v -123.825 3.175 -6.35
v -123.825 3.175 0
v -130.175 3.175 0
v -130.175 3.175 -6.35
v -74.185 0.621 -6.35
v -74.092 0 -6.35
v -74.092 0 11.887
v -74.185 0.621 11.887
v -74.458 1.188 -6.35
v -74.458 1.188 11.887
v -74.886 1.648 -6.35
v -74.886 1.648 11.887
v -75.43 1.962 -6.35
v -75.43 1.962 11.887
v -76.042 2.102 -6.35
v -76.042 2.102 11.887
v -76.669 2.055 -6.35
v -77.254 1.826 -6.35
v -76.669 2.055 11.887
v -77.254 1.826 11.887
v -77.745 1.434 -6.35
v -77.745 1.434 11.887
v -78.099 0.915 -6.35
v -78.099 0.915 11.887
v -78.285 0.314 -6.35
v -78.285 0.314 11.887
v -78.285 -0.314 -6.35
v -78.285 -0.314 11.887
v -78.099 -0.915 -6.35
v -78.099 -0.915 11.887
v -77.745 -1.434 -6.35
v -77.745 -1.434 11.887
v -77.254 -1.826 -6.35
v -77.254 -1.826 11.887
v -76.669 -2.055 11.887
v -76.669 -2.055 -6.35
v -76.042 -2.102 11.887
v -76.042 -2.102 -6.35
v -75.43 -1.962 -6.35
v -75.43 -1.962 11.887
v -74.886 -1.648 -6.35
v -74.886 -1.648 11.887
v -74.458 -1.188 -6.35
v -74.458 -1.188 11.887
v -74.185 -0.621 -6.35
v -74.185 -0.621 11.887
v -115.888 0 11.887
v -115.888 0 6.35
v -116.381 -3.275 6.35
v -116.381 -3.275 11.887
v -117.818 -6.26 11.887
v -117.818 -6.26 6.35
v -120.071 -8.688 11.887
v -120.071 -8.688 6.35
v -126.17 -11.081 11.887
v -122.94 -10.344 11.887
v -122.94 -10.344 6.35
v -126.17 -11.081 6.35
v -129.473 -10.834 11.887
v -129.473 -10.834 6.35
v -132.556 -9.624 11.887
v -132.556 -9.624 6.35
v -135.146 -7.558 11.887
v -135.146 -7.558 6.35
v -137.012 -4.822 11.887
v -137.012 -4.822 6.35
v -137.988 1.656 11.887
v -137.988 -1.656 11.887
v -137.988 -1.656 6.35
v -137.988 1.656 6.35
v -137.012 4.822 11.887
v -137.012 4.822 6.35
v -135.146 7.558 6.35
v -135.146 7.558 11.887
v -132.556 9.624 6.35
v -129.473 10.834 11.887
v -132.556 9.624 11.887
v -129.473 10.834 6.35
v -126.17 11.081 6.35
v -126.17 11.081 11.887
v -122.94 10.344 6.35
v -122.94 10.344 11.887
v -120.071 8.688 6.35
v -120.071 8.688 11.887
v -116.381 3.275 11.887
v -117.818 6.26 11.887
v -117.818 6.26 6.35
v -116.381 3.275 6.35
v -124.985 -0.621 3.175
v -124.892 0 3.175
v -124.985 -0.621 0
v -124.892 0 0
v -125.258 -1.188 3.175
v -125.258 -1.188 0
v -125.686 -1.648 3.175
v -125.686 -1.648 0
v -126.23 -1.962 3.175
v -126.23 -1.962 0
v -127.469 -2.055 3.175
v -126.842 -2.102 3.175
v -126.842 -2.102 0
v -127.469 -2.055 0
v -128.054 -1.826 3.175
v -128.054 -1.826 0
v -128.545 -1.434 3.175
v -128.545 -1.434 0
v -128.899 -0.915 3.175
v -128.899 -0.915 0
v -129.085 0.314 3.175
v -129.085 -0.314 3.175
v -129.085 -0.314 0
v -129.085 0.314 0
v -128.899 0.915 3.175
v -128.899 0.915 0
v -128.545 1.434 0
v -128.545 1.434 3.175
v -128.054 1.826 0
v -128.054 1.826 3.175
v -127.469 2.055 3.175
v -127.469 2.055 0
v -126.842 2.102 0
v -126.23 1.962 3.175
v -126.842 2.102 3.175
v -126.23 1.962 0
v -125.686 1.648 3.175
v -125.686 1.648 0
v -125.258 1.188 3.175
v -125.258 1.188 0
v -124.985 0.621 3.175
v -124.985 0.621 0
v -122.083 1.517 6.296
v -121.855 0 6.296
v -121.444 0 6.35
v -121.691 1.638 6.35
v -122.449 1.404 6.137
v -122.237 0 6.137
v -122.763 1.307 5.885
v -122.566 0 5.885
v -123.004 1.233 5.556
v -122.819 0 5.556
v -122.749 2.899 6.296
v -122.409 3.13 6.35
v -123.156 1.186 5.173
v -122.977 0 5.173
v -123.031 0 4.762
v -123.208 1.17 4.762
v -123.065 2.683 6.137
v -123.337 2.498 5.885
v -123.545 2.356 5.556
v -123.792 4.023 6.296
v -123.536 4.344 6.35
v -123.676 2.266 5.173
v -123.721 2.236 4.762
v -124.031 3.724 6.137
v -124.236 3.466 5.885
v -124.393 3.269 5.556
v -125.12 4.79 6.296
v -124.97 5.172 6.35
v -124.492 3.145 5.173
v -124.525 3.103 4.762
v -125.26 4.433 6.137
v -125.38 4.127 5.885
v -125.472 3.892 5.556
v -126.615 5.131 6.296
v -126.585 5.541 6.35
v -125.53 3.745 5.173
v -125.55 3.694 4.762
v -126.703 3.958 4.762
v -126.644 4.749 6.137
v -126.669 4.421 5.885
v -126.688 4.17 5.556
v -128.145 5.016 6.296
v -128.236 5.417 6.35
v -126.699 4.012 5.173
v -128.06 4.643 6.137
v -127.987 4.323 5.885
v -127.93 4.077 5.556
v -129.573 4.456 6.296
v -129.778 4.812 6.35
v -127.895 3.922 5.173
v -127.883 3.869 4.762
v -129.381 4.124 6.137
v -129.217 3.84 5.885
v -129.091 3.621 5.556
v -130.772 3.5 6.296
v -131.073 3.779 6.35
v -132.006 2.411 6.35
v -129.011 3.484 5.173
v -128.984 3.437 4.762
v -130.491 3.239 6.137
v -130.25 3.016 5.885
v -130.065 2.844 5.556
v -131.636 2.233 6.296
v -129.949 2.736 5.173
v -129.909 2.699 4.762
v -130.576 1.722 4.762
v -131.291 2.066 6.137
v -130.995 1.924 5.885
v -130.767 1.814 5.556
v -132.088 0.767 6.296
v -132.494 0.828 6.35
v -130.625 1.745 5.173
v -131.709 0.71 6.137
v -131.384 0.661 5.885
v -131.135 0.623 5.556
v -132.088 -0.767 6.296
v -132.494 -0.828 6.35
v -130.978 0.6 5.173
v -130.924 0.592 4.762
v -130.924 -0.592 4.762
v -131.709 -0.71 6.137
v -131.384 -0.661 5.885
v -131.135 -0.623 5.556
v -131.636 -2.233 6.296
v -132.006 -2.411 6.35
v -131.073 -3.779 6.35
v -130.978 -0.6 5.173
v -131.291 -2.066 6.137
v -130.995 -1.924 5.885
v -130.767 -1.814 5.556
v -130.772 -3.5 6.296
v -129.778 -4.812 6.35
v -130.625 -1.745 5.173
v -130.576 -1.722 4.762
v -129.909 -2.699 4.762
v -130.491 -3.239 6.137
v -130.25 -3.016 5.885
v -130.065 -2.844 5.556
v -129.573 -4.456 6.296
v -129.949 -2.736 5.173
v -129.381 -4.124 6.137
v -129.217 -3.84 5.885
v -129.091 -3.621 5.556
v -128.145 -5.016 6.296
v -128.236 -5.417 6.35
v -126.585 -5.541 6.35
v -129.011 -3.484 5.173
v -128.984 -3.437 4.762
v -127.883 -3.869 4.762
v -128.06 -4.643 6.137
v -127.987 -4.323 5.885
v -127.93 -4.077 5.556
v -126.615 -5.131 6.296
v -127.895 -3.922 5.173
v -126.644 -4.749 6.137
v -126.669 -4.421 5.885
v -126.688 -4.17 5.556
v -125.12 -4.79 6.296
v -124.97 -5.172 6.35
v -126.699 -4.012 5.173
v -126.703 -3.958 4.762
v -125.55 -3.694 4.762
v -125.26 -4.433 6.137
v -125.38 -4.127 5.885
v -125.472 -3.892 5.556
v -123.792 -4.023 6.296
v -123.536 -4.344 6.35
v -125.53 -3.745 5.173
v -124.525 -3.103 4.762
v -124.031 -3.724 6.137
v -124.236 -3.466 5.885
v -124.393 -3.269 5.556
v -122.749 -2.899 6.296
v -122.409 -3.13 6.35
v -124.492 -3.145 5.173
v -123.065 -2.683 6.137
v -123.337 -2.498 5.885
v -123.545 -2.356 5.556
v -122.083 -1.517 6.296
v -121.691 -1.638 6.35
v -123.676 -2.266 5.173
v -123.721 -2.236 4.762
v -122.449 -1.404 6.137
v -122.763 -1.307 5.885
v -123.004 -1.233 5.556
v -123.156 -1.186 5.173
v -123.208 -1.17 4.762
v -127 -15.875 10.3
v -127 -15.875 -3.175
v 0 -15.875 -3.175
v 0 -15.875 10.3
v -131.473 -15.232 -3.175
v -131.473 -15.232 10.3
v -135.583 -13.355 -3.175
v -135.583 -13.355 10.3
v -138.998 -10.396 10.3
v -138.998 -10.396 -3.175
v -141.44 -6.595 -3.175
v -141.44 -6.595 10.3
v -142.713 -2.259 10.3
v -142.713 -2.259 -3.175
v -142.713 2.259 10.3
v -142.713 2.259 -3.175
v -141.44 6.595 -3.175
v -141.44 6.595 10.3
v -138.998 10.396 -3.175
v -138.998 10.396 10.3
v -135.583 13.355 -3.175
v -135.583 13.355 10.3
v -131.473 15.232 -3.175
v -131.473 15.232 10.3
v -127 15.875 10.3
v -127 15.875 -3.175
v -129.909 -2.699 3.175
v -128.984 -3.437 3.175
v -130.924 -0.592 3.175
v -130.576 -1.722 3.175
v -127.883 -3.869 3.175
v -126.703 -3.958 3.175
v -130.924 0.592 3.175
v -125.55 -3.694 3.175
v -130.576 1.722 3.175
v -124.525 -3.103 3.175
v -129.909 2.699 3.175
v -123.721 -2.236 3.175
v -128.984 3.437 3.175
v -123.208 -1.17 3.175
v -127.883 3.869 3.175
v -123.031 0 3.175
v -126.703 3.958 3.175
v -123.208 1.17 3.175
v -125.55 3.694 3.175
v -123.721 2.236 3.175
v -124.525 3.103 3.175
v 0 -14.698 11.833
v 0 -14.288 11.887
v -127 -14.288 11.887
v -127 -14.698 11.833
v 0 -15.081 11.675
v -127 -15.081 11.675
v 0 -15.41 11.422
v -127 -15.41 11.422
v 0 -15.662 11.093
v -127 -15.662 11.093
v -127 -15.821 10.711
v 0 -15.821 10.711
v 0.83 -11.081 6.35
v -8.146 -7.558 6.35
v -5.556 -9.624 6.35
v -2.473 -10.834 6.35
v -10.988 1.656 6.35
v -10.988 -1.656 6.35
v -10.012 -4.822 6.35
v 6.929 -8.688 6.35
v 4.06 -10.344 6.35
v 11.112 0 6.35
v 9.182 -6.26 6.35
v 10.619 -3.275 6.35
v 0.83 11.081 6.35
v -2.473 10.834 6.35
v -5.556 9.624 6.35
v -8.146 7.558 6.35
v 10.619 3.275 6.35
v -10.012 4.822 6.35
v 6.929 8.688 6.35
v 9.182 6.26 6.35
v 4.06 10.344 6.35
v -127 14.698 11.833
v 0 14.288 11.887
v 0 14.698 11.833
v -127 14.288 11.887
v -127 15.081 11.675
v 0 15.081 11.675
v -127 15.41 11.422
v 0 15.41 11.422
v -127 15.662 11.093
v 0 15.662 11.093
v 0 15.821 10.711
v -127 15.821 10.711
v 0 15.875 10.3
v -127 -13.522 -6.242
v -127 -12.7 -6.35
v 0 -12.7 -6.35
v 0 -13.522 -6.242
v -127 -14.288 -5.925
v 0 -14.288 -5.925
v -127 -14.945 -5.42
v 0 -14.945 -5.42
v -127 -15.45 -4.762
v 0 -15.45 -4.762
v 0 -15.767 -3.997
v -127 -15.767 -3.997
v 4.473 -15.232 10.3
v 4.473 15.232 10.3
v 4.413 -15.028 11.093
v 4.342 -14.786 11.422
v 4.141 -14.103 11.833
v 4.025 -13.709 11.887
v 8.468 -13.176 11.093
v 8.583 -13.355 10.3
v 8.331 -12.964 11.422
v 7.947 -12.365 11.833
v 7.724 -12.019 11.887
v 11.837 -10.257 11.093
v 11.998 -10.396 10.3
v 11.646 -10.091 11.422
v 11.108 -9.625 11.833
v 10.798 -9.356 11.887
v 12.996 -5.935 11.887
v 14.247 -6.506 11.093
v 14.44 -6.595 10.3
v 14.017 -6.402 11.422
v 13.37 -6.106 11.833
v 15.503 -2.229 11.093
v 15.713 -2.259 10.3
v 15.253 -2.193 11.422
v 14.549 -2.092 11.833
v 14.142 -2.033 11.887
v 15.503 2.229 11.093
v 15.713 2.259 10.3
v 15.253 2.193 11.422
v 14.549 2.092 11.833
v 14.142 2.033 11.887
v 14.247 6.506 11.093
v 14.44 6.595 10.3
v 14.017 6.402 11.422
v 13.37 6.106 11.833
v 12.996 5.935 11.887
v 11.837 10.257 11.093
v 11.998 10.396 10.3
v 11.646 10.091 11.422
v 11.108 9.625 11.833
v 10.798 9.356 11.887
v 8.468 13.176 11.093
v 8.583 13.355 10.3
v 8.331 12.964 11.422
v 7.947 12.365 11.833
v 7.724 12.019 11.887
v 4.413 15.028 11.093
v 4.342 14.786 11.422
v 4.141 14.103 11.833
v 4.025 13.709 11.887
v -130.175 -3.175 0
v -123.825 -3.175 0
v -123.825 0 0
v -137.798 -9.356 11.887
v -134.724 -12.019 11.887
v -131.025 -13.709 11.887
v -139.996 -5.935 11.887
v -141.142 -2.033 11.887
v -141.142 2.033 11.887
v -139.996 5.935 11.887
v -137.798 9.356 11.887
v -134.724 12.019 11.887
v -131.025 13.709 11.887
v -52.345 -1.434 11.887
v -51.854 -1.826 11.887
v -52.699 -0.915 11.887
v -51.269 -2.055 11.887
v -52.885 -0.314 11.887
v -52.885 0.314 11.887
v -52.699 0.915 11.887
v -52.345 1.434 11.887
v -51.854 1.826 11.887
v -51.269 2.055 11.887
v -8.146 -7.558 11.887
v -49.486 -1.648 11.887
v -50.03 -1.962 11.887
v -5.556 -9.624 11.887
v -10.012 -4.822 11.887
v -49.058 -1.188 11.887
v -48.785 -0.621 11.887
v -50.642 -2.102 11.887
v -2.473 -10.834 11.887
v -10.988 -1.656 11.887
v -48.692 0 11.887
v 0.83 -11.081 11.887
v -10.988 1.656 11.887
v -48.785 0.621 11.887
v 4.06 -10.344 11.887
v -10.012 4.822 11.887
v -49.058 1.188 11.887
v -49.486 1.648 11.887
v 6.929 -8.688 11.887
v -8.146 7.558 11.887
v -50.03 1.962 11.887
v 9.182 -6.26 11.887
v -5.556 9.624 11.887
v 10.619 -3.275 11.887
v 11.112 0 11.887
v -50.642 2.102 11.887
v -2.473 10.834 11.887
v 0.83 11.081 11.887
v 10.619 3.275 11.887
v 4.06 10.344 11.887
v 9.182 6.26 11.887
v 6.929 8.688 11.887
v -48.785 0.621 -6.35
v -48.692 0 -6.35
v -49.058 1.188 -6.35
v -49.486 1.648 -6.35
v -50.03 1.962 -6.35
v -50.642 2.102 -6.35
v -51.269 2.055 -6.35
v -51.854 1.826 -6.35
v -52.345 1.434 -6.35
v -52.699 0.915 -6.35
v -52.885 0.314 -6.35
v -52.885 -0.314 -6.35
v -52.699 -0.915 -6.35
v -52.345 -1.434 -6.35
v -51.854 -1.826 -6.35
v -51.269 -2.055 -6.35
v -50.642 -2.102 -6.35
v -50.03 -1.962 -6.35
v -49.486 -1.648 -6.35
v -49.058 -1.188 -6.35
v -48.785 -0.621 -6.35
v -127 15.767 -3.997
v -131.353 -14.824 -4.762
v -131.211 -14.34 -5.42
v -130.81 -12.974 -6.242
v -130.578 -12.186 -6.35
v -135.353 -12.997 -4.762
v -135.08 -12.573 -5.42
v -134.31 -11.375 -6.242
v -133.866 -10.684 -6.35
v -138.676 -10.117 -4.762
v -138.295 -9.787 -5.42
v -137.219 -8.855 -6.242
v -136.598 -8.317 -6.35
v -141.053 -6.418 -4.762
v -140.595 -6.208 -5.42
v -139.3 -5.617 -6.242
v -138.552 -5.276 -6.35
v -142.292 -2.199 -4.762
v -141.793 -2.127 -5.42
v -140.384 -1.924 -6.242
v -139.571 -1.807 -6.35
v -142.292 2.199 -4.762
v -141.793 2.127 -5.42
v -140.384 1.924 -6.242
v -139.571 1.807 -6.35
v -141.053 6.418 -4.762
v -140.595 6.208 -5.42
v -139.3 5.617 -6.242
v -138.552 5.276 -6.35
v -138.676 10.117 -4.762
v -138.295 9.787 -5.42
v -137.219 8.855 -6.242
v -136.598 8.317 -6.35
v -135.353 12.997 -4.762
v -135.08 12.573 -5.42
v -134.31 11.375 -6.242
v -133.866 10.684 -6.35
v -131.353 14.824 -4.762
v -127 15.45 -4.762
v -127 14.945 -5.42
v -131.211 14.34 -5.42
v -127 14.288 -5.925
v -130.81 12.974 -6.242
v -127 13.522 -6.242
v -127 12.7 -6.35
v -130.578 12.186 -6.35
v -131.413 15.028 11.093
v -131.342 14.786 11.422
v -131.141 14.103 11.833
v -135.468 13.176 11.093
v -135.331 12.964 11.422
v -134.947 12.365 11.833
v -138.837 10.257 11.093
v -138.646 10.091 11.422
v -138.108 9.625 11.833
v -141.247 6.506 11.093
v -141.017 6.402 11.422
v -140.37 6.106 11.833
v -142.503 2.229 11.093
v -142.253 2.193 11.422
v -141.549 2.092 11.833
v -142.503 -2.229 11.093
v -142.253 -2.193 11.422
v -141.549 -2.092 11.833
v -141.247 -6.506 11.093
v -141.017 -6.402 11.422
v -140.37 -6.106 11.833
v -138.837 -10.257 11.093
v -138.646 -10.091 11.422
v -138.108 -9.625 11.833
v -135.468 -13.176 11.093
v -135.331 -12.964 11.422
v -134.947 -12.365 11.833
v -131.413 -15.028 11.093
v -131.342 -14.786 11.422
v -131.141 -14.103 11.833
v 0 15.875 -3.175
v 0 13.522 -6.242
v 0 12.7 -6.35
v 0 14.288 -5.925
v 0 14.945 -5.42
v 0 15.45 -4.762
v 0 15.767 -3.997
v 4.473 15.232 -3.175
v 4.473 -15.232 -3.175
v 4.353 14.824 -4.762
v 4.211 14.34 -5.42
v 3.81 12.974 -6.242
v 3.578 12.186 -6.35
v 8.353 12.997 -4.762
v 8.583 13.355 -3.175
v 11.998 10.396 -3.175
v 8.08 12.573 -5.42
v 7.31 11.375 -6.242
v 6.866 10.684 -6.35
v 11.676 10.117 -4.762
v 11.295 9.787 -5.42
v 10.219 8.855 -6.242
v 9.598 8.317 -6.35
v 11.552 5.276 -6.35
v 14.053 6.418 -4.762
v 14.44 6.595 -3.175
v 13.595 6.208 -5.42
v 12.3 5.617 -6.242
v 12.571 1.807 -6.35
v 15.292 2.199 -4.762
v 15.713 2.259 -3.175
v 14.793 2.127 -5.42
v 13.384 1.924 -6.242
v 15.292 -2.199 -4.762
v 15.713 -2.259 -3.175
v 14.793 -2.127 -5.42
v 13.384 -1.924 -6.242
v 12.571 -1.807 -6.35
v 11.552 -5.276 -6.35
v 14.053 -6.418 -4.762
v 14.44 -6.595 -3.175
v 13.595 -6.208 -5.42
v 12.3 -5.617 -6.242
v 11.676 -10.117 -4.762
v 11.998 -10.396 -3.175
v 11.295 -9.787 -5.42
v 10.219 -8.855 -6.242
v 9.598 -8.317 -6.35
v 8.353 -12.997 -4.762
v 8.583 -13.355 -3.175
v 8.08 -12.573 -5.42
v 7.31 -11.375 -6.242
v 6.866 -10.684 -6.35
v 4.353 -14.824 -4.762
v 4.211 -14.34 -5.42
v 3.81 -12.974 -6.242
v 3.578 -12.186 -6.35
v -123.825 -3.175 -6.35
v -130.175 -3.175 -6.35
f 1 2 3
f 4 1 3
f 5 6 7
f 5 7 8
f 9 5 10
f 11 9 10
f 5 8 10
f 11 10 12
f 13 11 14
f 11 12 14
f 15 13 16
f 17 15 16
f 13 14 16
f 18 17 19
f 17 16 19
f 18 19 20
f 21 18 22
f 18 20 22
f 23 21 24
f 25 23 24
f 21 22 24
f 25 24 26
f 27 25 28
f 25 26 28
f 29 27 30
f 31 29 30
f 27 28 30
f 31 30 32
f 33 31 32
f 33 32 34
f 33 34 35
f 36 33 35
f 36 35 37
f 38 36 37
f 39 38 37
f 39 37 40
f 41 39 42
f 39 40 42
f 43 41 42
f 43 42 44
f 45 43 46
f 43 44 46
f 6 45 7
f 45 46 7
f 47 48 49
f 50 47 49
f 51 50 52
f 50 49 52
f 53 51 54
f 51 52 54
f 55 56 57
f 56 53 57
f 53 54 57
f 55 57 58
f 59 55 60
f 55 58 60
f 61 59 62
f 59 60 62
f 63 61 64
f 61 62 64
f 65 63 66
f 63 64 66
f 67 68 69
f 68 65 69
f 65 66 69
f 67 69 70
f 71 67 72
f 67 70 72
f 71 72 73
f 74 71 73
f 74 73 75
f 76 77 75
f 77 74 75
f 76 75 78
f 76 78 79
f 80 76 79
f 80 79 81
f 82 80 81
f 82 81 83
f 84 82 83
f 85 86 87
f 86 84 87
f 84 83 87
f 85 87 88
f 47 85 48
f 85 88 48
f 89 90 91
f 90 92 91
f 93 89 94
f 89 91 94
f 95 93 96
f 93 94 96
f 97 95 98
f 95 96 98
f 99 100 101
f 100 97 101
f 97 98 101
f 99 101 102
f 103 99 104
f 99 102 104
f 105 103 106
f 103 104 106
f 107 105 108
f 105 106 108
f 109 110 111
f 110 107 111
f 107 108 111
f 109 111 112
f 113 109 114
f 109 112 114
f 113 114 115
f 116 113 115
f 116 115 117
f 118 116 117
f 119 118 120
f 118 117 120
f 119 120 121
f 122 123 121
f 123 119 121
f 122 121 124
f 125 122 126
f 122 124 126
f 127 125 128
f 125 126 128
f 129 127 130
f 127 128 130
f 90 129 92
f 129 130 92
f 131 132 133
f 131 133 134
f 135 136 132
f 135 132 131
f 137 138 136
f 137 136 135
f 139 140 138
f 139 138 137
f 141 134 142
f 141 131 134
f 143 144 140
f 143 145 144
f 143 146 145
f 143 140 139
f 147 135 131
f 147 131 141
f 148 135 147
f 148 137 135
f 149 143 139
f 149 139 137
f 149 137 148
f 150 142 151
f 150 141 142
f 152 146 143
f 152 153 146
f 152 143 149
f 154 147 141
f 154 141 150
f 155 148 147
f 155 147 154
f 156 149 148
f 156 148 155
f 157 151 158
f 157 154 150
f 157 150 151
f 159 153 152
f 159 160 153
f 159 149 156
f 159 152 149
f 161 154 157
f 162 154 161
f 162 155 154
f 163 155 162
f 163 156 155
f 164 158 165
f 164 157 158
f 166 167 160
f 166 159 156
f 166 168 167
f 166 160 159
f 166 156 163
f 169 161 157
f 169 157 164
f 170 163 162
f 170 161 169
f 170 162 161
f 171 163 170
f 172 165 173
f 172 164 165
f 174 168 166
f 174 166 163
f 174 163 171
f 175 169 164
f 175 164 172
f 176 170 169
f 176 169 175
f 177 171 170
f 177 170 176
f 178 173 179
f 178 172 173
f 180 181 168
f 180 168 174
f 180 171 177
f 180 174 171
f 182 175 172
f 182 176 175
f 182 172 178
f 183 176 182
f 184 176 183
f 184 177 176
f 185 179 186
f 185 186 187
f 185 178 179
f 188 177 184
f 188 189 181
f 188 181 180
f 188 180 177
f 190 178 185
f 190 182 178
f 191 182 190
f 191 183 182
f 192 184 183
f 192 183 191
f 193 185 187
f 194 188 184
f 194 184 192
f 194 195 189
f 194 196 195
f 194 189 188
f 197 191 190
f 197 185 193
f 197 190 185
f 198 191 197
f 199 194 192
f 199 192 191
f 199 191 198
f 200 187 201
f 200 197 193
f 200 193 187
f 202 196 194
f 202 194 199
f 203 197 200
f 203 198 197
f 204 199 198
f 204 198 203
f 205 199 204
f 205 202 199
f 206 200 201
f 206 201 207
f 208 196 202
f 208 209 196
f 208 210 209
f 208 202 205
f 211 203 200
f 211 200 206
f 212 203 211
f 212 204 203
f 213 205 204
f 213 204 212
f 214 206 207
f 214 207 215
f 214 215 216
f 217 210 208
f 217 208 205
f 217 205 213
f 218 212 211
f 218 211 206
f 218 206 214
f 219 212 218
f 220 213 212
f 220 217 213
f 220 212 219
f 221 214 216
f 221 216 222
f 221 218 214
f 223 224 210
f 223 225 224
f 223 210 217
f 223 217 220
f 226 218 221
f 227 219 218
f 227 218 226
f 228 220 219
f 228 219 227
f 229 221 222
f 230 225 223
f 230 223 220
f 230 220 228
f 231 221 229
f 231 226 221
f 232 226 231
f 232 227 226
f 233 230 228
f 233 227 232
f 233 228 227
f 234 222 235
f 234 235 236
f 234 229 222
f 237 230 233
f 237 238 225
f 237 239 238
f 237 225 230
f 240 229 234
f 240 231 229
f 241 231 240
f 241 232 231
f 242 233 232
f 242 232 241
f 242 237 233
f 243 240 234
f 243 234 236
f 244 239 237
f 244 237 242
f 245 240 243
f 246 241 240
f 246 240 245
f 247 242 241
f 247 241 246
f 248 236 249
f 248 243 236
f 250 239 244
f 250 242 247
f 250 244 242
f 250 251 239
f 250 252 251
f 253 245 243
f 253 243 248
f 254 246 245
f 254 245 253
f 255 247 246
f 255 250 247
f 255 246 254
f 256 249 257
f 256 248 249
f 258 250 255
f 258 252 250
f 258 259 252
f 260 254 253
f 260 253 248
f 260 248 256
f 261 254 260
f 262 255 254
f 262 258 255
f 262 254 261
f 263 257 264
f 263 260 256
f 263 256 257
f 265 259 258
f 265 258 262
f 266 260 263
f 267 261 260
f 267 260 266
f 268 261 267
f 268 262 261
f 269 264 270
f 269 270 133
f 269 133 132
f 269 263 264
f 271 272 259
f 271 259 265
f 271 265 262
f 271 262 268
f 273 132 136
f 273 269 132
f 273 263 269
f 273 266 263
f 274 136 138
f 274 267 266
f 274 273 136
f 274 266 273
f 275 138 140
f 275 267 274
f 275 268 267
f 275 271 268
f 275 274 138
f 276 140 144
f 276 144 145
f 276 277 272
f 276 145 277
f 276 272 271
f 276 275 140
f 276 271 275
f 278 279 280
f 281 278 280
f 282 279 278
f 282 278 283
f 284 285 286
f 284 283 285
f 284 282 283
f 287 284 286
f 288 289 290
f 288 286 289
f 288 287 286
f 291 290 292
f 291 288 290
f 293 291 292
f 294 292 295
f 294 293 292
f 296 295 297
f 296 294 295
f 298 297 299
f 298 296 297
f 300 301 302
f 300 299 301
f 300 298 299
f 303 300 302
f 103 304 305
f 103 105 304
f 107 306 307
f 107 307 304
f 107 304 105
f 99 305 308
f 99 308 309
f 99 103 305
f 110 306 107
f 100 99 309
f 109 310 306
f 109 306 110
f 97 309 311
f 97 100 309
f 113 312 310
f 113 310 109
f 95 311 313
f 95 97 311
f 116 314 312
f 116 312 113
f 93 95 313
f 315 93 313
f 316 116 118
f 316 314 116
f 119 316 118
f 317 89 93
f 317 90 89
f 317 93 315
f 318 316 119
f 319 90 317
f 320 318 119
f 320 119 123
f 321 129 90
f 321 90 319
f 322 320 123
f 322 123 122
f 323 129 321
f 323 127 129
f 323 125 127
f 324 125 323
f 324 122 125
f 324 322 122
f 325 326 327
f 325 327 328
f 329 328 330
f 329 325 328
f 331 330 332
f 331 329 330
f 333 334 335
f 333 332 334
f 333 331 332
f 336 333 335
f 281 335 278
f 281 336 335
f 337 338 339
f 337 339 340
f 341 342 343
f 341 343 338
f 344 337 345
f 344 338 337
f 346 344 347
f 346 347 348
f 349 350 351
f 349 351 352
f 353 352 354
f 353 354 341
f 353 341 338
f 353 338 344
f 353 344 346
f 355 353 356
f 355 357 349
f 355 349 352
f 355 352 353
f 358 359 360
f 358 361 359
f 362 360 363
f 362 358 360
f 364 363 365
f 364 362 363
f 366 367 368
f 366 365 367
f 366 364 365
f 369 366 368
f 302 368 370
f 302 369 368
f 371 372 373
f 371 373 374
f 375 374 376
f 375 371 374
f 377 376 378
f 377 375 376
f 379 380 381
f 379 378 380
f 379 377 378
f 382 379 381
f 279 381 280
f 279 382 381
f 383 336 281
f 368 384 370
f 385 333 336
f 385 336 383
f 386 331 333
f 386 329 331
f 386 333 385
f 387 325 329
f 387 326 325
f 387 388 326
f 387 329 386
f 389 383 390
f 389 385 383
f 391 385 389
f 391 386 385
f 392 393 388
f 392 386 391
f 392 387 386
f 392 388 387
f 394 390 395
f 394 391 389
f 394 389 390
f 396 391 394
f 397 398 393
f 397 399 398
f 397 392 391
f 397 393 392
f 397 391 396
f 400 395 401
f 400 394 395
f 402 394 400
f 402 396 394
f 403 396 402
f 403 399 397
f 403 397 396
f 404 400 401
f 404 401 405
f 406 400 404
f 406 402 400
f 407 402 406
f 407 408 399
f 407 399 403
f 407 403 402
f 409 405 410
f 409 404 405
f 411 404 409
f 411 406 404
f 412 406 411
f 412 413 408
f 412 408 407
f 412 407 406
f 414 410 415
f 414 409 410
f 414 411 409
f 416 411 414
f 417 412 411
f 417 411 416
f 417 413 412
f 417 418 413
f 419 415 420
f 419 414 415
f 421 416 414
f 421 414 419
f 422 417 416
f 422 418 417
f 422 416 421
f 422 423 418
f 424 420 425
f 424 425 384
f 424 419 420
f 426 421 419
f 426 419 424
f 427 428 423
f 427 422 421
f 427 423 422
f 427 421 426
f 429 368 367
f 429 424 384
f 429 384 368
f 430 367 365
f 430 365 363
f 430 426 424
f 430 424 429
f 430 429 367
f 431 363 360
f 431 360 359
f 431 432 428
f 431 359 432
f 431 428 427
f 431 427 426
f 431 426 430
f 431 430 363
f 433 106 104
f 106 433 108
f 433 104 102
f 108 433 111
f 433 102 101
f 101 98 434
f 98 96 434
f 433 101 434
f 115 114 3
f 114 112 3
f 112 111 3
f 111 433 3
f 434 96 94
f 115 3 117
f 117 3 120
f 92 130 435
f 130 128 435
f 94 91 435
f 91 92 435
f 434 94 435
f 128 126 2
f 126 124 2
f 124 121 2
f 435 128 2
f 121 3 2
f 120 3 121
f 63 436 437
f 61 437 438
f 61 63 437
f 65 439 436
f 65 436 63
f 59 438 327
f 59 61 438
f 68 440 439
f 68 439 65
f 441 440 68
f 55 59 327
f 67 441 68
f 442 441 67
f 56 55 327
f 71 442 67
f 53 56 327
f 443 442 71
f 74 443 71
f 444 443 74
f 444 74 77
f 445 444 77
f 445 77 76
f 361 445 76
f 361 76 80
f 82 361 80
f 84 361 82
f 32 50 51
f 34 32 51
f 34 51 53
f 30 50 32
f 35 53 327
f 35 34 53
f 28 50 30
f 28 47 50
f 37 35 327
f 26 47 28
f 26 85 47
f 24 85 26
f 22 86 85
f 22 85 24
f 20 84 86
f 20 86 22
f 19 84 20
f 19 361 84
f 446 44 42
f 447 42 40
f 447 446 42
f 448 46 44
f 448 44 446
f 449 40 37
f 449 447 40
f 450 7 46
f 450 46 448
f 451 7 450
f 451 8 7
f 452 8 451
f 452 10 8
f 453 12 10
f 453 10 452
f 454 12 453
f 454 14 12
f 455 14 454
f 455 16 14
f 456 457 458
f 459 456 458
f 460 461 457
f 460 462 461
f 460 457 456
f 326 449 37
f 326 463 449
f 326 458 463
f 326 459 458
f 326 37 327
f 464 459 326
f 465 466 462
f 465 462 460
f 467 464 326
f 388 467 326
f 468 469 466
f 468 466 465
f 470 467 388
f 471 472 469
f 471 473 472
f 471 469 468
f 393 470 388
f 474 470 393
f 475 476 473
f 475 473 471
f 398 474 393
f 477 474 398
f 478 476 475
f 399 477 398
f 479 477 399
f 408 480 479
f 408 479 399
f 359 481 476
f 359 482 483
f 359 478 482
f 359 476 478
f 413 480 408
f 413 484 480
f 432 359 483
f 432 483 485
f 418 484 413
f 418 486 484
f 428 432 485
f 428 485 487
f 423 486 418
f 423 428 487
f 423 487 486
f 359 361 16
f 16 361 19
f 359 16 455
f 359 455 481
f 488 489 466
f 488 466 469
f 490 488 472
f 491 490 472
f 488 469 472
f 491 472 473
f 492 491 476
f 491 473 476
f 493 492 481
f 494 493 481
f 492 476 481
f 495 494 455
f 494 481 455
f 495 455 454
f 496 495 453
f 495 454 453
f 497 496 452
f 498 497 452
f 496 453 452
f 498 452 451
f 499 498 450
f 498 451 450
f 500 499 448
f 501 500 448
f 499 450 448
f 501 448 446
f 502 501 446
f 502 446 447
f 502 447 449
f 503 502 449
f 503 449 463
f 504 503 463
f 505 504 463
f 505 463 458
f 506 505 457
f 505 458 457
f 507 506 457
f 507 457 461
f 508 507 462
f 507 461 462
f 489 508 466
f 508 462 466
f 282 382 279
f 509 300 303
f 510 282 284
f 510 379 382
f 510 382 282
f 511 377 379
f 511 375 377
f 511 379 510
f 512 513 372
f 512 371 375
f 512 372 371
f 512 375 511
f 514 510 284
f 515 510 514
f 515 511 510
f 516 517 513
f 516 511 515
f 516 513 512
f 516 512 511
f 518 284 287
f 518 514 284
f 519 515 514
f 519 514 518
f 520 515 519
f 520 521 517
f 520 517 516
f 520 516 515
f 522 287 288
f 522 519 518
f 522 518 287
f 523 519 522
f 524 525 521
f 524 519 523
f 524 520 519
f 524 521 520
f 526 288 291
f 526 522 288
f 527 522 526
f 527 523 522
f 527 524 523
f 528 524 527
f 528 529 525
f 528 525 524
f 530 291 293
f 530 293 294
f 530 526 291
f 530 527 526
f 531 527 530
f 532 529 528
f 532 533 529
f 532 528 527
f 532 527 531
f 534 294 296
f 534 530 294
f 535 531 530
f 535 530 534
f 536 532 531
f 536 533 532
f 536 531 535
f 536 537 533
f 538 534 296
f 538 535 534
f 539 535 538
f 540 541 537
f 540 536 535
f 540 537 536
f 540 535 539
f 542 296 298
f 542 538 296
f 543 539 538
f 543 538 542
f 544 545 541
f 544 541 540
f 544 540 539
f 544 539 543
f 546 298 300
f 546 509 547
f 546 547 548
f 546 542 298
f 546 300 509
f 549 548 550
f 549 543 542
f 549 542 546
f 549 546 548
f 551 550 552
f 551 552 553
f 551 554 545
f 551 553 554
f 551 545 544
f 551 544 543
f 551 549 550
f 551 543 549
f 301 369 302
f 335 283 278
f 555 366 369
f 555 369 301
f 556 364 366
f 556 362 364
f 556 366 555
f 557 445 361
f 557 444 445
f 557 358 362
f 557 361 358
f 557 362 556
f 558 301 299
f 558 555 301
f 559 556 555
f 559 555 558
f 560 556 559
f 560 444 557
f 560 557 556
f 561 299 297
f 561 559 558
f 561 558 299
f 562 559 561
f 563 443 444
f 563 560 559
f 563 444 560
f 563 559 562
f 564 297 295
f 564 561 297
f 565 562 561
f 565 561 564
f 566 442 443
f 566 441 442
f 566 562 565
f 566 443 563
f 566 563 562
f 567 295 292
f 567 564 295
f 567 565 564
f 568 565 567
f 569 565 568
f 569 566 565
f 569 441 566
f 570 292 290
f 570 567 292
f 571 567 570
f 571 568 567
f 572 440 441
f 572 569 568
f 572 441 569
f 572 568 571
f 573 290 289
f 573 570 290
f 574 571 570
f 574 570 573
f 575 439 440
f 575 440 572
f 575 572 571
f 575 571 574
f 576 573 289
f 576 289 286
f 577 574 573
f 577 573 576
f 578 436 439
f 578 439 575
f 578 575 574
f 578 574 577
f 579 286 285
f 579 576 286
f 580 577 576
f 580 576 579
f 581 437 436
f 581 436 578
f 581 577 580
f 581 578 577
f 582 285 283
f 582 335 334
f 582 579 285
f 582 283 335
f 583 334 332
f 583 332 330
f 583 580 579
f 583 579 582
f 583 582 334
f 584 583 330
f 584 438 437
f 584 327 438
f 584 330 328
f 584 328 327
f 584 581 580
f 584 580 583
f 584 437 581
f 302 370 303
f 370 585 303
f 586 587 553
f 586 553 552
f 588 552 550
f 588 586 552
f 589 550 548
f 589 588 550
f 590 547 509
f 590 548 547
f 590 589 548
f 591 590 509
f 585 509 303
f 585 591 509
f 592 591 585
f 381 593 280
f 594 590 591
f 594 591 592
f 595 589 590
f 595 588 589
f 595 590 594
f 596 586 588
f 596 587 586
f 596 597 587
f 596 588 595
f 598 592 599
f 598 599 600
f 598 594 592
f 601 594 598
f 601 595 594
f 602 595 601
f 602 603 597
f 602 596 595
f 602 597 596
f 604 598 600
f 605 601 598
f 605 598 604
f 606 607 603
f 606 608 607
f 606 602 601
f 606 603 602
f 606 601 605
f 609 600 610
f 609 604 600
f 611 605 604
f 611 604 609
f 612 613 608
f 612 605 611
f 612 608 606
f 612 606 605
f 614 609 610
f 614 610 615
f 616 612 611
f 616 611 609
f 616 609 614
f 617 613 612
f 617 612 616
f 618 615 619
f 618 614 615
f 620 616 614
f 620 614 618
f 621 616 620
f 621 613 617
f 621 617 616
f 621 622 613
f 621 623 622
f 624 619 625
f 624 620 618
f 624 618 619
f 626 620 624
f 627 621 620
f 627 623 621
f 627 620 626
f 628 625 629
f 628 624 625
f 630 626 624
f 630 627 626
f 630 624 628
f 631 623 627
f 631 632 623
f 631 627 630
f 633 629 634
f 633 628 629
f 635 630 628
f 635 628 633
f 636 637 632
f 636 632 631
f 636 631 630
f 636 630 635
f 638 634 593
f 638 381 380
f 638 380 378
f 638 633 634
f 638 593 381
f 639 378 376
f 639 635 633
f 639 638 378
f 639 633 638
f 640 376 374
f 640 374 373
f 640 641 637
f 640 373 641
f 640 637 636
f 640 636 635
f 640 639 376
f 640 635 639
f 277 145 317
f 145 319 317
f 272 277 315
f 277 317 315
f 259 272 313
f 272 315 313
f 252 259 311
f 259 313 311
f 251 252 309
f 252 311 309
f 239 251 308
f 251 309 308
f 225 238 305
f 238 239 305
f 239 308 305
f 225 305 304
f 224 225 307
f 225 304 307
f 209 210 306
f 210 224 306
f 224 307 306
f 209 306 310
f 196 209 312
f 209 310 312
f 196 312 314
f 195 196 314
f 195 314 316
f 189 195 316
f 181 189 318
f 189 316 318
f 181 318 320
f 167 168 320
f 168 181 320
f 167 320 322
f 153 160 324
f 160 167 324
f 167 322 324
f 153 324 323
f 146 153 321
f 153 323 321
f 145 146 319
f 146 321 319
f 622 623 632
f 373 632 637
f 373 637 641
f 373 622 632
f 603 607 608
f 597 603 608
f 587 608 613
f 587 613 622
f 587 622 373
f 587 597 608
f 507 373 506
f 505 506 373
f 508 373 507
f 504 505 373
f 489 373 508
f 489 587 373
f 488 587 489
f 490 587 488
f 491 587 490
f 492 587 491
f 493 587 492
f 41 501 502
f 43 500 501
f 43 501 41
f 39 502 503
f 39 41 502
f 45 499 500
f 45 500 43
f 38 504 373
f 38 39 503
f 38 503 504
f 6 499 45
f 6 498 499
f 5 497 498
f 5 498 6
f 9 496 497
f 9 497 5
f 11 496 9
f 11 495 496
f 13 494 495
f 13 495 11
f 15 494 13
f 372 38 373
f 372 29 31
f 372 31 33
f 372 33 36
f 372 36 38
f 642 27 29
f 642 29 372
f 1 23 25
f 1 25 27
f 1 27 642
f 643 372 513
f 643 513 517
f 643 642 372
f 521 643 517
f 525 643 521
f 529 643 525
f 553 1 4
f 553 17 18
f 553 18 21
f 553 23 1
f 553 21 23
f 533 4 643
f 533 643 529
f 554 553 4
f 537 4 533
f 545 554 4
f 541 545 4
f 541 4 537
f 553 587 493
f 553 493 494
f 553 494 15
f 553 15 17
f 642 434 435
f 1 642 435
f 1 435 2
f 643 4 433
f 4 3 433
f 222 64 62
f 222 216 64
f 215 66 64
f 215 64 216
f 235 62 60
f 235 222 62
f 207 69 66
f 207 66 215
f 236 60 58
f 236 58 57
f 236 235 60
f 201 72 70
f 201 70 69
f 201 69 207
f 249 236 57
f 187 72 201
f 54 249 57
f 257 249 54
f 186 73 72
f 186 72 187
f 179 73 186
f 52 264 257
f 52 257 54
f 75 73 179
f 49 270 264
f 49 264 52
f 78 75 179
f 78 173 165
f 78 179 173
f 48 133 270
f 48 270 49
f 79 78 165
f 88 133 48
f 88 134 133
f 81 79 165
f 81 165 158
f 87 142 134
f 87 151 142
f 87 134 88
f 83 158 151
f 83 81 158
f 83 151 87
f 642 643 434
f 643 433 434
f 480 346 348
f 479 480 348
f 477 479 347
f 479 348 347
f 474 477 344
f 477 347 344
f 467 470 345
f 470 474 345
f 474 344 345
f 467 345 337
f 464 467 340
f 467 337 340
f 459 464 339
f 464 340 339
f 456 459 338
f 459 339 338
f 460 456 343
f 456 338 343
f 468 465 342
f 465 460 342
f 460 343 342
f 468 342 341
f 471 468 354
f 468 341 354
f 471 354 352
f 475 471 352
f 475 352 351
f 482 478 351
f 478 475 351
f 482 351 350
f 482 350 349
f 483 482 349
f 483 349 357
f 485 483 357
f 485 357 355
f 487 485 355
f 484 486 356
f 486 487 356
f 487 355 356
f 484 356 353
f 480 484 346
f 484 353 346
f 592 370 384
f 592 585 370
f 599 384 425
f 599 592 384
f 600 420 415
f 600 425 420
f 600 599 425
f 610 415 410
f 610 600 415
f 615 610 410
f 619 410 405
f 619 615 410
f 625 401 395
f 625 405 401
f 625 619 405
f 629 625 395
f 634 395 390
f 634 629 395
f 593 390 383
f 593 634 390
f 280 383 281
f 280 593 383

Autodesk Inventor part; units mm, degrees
ref_plane "YZ Plane" through (0, 0, 0) normal (1, 0, 0) x (0, 1, 0)
ref_plane "XZ Plane" through (0, 0, 0) normal (0, 1, 0) x (-1, 0, 0)
ref_plane "XY Plane" through (0, 0, 0) normal (0, 0, 1) x (1, 0, 0)
sketch "Sketch1" plane through (0, 0, 0) normal (0, 0, 1) x (1, 0, 0)
  circle A0 centre (0, 0) radius 15.875
  line L0 (0, 0) -> (-127, 0)
  circle A1 centre (-127, 0) radius 15.875
  line L1 (-127, 15.875) -> (0, 15.875)
  line L2 (0, -15.875) -> (-127, -15.875)
  circle A2 centre (-127, 0) radius 2.1082
  dimension "d0" = 31.75
  dimension "d1" = 127
  dimension "d2" = 31.75
  dimension "d3" = 4.2164
extrude "Extrusion1" add sketch "Sketch1" along normal blind 3.175
sketch "Sketch2" plane through (0, 0, 0) normal (0, 0, -1) x (-1, 0, 0)
  arc A0 (127, -15.875) -> (127, 15.875) centre (127, 0) ccw projected
  line L0 (0, 15.875) -> (127, 15.875) projected
  arc A1 (0, 15.875) -> (0, -15.875) centre (0, 0) ccw projected
  line L1 (127, -15.875) -> (0, -15.875) projected
  circle A2 centre (127, 0) radius 2.1082 projected
  line L2 (130.175, -3.175) -> (123.825, -3.175)
  line L3 (123.825, -3.175) -> (123.825, 3.175)
  line L4 (123.825, 3.175) -> (130.175, 3.175)
  line L5 (130.175, 3.175) -> (130.175, -3.175)
  line L6 (130.175, -3.175) -> (123.825, 3.175) construction
  line L7 (123.825, -3.175) -> (130.175, 3.175) construction
  dimension "d25" = 6.35
  dimension "d26" = 6.35
extrude "Extrusion2" add sketch "Sketch2" along normal blind 6.35 contours L1 A1 L0 A0
fillet "Fillet1" radius 3.175 4 edges at (15.875, 0, -6.35) (-63.5, -15.875, -6.35) (-142.875, 0, -6.35) (-63.5, 15.875, -6.35)
sketch "Sketch3" plane through (0, 0, 3.175) normal (0, 0, 1) x (1, 0, 0)
  arc A0 (-127, 15.875) -> (-127, -15.875) centre (-127, 0) ccw projected
  line L0 (-127, -15.875) -> (0, -15.875) projected
  arc A1 (0, -15.875) -> (0, 15.875) centre (0, 0) ccw projected
  line L1 (0, 15.875) -> (-127, 15.875) projected
  circle A2 centre (-127, 0) radius 2.1082 projected
  circle A3 centre (-127, 0) radius 3.9688
  dimension "d10" = 7.9375
extrude "Extrusion3" add sketch "Sketch3" along normal blind 3.175 contours L1 A1 L0 A0
sketch "Sketch4" plane through (0, 0, 6.35) normal (0, 0, 1) x (1, 0, 0)
  line L0 (-127, -15.875) -> (0, -15.875) projected
  arc A0 (0, -15.875) -> (0, 15.875) centre (0, 0) ccw projected
  line L1 (0, 15.875) -> (-127, 15.875) projected
  arc A1 (-127, 15.875) -> (-127, -15.875) centre (-127, 0) ccw projected
  circle A2 centre (-127, 0) radius 3.9688 projected
  circle A3 centre (-127, 0) radius 2.1082 projected
  circle A4 centre (-127, 0) radius 11.1125
  circle A5 centre (0, 0) radius 11.1125
  dimension "d13" = 22.225
  dimension "d14" = 22.225
extrude "Extrusion4" add sketch "Sketch4" along normal blind 5.5372 contours A1 L1 A0 L0
sketch "Sketch5" plane through (0, 0, 11.8872) normal (0, 0, 1) x (1, 0, 0)
  circle A0 centre (-76.2, 0) radius 2.1082
  circle A1 centre (-50.8, 0) radius 2.1082
  circle A2 centre (-127, 0) radius 2.1082 projected
  point P0 (0, 0)
  dimension "d17" = 4.2164
  dimension "d18" = 4.2164
  dimension "d19" = 50.8
  dimension "d20" = 50.8
extrude "Extrusion5" cut sketch "Sketch5" against normal blind 25.4 contours A0 | A1
fillet "Fillet2" radius 1.5875 4 edges at (-142.875, 0, 11.8872) (-63.5, -15.875, 11.8872) (15.875, 0, 11.8872) (-63.5, 15.875, 11.8872)
fillet "Fillet3" radius 1.5875 1 edges at (-130.9688, 0, 6.35)
properties part number "Plate E"
